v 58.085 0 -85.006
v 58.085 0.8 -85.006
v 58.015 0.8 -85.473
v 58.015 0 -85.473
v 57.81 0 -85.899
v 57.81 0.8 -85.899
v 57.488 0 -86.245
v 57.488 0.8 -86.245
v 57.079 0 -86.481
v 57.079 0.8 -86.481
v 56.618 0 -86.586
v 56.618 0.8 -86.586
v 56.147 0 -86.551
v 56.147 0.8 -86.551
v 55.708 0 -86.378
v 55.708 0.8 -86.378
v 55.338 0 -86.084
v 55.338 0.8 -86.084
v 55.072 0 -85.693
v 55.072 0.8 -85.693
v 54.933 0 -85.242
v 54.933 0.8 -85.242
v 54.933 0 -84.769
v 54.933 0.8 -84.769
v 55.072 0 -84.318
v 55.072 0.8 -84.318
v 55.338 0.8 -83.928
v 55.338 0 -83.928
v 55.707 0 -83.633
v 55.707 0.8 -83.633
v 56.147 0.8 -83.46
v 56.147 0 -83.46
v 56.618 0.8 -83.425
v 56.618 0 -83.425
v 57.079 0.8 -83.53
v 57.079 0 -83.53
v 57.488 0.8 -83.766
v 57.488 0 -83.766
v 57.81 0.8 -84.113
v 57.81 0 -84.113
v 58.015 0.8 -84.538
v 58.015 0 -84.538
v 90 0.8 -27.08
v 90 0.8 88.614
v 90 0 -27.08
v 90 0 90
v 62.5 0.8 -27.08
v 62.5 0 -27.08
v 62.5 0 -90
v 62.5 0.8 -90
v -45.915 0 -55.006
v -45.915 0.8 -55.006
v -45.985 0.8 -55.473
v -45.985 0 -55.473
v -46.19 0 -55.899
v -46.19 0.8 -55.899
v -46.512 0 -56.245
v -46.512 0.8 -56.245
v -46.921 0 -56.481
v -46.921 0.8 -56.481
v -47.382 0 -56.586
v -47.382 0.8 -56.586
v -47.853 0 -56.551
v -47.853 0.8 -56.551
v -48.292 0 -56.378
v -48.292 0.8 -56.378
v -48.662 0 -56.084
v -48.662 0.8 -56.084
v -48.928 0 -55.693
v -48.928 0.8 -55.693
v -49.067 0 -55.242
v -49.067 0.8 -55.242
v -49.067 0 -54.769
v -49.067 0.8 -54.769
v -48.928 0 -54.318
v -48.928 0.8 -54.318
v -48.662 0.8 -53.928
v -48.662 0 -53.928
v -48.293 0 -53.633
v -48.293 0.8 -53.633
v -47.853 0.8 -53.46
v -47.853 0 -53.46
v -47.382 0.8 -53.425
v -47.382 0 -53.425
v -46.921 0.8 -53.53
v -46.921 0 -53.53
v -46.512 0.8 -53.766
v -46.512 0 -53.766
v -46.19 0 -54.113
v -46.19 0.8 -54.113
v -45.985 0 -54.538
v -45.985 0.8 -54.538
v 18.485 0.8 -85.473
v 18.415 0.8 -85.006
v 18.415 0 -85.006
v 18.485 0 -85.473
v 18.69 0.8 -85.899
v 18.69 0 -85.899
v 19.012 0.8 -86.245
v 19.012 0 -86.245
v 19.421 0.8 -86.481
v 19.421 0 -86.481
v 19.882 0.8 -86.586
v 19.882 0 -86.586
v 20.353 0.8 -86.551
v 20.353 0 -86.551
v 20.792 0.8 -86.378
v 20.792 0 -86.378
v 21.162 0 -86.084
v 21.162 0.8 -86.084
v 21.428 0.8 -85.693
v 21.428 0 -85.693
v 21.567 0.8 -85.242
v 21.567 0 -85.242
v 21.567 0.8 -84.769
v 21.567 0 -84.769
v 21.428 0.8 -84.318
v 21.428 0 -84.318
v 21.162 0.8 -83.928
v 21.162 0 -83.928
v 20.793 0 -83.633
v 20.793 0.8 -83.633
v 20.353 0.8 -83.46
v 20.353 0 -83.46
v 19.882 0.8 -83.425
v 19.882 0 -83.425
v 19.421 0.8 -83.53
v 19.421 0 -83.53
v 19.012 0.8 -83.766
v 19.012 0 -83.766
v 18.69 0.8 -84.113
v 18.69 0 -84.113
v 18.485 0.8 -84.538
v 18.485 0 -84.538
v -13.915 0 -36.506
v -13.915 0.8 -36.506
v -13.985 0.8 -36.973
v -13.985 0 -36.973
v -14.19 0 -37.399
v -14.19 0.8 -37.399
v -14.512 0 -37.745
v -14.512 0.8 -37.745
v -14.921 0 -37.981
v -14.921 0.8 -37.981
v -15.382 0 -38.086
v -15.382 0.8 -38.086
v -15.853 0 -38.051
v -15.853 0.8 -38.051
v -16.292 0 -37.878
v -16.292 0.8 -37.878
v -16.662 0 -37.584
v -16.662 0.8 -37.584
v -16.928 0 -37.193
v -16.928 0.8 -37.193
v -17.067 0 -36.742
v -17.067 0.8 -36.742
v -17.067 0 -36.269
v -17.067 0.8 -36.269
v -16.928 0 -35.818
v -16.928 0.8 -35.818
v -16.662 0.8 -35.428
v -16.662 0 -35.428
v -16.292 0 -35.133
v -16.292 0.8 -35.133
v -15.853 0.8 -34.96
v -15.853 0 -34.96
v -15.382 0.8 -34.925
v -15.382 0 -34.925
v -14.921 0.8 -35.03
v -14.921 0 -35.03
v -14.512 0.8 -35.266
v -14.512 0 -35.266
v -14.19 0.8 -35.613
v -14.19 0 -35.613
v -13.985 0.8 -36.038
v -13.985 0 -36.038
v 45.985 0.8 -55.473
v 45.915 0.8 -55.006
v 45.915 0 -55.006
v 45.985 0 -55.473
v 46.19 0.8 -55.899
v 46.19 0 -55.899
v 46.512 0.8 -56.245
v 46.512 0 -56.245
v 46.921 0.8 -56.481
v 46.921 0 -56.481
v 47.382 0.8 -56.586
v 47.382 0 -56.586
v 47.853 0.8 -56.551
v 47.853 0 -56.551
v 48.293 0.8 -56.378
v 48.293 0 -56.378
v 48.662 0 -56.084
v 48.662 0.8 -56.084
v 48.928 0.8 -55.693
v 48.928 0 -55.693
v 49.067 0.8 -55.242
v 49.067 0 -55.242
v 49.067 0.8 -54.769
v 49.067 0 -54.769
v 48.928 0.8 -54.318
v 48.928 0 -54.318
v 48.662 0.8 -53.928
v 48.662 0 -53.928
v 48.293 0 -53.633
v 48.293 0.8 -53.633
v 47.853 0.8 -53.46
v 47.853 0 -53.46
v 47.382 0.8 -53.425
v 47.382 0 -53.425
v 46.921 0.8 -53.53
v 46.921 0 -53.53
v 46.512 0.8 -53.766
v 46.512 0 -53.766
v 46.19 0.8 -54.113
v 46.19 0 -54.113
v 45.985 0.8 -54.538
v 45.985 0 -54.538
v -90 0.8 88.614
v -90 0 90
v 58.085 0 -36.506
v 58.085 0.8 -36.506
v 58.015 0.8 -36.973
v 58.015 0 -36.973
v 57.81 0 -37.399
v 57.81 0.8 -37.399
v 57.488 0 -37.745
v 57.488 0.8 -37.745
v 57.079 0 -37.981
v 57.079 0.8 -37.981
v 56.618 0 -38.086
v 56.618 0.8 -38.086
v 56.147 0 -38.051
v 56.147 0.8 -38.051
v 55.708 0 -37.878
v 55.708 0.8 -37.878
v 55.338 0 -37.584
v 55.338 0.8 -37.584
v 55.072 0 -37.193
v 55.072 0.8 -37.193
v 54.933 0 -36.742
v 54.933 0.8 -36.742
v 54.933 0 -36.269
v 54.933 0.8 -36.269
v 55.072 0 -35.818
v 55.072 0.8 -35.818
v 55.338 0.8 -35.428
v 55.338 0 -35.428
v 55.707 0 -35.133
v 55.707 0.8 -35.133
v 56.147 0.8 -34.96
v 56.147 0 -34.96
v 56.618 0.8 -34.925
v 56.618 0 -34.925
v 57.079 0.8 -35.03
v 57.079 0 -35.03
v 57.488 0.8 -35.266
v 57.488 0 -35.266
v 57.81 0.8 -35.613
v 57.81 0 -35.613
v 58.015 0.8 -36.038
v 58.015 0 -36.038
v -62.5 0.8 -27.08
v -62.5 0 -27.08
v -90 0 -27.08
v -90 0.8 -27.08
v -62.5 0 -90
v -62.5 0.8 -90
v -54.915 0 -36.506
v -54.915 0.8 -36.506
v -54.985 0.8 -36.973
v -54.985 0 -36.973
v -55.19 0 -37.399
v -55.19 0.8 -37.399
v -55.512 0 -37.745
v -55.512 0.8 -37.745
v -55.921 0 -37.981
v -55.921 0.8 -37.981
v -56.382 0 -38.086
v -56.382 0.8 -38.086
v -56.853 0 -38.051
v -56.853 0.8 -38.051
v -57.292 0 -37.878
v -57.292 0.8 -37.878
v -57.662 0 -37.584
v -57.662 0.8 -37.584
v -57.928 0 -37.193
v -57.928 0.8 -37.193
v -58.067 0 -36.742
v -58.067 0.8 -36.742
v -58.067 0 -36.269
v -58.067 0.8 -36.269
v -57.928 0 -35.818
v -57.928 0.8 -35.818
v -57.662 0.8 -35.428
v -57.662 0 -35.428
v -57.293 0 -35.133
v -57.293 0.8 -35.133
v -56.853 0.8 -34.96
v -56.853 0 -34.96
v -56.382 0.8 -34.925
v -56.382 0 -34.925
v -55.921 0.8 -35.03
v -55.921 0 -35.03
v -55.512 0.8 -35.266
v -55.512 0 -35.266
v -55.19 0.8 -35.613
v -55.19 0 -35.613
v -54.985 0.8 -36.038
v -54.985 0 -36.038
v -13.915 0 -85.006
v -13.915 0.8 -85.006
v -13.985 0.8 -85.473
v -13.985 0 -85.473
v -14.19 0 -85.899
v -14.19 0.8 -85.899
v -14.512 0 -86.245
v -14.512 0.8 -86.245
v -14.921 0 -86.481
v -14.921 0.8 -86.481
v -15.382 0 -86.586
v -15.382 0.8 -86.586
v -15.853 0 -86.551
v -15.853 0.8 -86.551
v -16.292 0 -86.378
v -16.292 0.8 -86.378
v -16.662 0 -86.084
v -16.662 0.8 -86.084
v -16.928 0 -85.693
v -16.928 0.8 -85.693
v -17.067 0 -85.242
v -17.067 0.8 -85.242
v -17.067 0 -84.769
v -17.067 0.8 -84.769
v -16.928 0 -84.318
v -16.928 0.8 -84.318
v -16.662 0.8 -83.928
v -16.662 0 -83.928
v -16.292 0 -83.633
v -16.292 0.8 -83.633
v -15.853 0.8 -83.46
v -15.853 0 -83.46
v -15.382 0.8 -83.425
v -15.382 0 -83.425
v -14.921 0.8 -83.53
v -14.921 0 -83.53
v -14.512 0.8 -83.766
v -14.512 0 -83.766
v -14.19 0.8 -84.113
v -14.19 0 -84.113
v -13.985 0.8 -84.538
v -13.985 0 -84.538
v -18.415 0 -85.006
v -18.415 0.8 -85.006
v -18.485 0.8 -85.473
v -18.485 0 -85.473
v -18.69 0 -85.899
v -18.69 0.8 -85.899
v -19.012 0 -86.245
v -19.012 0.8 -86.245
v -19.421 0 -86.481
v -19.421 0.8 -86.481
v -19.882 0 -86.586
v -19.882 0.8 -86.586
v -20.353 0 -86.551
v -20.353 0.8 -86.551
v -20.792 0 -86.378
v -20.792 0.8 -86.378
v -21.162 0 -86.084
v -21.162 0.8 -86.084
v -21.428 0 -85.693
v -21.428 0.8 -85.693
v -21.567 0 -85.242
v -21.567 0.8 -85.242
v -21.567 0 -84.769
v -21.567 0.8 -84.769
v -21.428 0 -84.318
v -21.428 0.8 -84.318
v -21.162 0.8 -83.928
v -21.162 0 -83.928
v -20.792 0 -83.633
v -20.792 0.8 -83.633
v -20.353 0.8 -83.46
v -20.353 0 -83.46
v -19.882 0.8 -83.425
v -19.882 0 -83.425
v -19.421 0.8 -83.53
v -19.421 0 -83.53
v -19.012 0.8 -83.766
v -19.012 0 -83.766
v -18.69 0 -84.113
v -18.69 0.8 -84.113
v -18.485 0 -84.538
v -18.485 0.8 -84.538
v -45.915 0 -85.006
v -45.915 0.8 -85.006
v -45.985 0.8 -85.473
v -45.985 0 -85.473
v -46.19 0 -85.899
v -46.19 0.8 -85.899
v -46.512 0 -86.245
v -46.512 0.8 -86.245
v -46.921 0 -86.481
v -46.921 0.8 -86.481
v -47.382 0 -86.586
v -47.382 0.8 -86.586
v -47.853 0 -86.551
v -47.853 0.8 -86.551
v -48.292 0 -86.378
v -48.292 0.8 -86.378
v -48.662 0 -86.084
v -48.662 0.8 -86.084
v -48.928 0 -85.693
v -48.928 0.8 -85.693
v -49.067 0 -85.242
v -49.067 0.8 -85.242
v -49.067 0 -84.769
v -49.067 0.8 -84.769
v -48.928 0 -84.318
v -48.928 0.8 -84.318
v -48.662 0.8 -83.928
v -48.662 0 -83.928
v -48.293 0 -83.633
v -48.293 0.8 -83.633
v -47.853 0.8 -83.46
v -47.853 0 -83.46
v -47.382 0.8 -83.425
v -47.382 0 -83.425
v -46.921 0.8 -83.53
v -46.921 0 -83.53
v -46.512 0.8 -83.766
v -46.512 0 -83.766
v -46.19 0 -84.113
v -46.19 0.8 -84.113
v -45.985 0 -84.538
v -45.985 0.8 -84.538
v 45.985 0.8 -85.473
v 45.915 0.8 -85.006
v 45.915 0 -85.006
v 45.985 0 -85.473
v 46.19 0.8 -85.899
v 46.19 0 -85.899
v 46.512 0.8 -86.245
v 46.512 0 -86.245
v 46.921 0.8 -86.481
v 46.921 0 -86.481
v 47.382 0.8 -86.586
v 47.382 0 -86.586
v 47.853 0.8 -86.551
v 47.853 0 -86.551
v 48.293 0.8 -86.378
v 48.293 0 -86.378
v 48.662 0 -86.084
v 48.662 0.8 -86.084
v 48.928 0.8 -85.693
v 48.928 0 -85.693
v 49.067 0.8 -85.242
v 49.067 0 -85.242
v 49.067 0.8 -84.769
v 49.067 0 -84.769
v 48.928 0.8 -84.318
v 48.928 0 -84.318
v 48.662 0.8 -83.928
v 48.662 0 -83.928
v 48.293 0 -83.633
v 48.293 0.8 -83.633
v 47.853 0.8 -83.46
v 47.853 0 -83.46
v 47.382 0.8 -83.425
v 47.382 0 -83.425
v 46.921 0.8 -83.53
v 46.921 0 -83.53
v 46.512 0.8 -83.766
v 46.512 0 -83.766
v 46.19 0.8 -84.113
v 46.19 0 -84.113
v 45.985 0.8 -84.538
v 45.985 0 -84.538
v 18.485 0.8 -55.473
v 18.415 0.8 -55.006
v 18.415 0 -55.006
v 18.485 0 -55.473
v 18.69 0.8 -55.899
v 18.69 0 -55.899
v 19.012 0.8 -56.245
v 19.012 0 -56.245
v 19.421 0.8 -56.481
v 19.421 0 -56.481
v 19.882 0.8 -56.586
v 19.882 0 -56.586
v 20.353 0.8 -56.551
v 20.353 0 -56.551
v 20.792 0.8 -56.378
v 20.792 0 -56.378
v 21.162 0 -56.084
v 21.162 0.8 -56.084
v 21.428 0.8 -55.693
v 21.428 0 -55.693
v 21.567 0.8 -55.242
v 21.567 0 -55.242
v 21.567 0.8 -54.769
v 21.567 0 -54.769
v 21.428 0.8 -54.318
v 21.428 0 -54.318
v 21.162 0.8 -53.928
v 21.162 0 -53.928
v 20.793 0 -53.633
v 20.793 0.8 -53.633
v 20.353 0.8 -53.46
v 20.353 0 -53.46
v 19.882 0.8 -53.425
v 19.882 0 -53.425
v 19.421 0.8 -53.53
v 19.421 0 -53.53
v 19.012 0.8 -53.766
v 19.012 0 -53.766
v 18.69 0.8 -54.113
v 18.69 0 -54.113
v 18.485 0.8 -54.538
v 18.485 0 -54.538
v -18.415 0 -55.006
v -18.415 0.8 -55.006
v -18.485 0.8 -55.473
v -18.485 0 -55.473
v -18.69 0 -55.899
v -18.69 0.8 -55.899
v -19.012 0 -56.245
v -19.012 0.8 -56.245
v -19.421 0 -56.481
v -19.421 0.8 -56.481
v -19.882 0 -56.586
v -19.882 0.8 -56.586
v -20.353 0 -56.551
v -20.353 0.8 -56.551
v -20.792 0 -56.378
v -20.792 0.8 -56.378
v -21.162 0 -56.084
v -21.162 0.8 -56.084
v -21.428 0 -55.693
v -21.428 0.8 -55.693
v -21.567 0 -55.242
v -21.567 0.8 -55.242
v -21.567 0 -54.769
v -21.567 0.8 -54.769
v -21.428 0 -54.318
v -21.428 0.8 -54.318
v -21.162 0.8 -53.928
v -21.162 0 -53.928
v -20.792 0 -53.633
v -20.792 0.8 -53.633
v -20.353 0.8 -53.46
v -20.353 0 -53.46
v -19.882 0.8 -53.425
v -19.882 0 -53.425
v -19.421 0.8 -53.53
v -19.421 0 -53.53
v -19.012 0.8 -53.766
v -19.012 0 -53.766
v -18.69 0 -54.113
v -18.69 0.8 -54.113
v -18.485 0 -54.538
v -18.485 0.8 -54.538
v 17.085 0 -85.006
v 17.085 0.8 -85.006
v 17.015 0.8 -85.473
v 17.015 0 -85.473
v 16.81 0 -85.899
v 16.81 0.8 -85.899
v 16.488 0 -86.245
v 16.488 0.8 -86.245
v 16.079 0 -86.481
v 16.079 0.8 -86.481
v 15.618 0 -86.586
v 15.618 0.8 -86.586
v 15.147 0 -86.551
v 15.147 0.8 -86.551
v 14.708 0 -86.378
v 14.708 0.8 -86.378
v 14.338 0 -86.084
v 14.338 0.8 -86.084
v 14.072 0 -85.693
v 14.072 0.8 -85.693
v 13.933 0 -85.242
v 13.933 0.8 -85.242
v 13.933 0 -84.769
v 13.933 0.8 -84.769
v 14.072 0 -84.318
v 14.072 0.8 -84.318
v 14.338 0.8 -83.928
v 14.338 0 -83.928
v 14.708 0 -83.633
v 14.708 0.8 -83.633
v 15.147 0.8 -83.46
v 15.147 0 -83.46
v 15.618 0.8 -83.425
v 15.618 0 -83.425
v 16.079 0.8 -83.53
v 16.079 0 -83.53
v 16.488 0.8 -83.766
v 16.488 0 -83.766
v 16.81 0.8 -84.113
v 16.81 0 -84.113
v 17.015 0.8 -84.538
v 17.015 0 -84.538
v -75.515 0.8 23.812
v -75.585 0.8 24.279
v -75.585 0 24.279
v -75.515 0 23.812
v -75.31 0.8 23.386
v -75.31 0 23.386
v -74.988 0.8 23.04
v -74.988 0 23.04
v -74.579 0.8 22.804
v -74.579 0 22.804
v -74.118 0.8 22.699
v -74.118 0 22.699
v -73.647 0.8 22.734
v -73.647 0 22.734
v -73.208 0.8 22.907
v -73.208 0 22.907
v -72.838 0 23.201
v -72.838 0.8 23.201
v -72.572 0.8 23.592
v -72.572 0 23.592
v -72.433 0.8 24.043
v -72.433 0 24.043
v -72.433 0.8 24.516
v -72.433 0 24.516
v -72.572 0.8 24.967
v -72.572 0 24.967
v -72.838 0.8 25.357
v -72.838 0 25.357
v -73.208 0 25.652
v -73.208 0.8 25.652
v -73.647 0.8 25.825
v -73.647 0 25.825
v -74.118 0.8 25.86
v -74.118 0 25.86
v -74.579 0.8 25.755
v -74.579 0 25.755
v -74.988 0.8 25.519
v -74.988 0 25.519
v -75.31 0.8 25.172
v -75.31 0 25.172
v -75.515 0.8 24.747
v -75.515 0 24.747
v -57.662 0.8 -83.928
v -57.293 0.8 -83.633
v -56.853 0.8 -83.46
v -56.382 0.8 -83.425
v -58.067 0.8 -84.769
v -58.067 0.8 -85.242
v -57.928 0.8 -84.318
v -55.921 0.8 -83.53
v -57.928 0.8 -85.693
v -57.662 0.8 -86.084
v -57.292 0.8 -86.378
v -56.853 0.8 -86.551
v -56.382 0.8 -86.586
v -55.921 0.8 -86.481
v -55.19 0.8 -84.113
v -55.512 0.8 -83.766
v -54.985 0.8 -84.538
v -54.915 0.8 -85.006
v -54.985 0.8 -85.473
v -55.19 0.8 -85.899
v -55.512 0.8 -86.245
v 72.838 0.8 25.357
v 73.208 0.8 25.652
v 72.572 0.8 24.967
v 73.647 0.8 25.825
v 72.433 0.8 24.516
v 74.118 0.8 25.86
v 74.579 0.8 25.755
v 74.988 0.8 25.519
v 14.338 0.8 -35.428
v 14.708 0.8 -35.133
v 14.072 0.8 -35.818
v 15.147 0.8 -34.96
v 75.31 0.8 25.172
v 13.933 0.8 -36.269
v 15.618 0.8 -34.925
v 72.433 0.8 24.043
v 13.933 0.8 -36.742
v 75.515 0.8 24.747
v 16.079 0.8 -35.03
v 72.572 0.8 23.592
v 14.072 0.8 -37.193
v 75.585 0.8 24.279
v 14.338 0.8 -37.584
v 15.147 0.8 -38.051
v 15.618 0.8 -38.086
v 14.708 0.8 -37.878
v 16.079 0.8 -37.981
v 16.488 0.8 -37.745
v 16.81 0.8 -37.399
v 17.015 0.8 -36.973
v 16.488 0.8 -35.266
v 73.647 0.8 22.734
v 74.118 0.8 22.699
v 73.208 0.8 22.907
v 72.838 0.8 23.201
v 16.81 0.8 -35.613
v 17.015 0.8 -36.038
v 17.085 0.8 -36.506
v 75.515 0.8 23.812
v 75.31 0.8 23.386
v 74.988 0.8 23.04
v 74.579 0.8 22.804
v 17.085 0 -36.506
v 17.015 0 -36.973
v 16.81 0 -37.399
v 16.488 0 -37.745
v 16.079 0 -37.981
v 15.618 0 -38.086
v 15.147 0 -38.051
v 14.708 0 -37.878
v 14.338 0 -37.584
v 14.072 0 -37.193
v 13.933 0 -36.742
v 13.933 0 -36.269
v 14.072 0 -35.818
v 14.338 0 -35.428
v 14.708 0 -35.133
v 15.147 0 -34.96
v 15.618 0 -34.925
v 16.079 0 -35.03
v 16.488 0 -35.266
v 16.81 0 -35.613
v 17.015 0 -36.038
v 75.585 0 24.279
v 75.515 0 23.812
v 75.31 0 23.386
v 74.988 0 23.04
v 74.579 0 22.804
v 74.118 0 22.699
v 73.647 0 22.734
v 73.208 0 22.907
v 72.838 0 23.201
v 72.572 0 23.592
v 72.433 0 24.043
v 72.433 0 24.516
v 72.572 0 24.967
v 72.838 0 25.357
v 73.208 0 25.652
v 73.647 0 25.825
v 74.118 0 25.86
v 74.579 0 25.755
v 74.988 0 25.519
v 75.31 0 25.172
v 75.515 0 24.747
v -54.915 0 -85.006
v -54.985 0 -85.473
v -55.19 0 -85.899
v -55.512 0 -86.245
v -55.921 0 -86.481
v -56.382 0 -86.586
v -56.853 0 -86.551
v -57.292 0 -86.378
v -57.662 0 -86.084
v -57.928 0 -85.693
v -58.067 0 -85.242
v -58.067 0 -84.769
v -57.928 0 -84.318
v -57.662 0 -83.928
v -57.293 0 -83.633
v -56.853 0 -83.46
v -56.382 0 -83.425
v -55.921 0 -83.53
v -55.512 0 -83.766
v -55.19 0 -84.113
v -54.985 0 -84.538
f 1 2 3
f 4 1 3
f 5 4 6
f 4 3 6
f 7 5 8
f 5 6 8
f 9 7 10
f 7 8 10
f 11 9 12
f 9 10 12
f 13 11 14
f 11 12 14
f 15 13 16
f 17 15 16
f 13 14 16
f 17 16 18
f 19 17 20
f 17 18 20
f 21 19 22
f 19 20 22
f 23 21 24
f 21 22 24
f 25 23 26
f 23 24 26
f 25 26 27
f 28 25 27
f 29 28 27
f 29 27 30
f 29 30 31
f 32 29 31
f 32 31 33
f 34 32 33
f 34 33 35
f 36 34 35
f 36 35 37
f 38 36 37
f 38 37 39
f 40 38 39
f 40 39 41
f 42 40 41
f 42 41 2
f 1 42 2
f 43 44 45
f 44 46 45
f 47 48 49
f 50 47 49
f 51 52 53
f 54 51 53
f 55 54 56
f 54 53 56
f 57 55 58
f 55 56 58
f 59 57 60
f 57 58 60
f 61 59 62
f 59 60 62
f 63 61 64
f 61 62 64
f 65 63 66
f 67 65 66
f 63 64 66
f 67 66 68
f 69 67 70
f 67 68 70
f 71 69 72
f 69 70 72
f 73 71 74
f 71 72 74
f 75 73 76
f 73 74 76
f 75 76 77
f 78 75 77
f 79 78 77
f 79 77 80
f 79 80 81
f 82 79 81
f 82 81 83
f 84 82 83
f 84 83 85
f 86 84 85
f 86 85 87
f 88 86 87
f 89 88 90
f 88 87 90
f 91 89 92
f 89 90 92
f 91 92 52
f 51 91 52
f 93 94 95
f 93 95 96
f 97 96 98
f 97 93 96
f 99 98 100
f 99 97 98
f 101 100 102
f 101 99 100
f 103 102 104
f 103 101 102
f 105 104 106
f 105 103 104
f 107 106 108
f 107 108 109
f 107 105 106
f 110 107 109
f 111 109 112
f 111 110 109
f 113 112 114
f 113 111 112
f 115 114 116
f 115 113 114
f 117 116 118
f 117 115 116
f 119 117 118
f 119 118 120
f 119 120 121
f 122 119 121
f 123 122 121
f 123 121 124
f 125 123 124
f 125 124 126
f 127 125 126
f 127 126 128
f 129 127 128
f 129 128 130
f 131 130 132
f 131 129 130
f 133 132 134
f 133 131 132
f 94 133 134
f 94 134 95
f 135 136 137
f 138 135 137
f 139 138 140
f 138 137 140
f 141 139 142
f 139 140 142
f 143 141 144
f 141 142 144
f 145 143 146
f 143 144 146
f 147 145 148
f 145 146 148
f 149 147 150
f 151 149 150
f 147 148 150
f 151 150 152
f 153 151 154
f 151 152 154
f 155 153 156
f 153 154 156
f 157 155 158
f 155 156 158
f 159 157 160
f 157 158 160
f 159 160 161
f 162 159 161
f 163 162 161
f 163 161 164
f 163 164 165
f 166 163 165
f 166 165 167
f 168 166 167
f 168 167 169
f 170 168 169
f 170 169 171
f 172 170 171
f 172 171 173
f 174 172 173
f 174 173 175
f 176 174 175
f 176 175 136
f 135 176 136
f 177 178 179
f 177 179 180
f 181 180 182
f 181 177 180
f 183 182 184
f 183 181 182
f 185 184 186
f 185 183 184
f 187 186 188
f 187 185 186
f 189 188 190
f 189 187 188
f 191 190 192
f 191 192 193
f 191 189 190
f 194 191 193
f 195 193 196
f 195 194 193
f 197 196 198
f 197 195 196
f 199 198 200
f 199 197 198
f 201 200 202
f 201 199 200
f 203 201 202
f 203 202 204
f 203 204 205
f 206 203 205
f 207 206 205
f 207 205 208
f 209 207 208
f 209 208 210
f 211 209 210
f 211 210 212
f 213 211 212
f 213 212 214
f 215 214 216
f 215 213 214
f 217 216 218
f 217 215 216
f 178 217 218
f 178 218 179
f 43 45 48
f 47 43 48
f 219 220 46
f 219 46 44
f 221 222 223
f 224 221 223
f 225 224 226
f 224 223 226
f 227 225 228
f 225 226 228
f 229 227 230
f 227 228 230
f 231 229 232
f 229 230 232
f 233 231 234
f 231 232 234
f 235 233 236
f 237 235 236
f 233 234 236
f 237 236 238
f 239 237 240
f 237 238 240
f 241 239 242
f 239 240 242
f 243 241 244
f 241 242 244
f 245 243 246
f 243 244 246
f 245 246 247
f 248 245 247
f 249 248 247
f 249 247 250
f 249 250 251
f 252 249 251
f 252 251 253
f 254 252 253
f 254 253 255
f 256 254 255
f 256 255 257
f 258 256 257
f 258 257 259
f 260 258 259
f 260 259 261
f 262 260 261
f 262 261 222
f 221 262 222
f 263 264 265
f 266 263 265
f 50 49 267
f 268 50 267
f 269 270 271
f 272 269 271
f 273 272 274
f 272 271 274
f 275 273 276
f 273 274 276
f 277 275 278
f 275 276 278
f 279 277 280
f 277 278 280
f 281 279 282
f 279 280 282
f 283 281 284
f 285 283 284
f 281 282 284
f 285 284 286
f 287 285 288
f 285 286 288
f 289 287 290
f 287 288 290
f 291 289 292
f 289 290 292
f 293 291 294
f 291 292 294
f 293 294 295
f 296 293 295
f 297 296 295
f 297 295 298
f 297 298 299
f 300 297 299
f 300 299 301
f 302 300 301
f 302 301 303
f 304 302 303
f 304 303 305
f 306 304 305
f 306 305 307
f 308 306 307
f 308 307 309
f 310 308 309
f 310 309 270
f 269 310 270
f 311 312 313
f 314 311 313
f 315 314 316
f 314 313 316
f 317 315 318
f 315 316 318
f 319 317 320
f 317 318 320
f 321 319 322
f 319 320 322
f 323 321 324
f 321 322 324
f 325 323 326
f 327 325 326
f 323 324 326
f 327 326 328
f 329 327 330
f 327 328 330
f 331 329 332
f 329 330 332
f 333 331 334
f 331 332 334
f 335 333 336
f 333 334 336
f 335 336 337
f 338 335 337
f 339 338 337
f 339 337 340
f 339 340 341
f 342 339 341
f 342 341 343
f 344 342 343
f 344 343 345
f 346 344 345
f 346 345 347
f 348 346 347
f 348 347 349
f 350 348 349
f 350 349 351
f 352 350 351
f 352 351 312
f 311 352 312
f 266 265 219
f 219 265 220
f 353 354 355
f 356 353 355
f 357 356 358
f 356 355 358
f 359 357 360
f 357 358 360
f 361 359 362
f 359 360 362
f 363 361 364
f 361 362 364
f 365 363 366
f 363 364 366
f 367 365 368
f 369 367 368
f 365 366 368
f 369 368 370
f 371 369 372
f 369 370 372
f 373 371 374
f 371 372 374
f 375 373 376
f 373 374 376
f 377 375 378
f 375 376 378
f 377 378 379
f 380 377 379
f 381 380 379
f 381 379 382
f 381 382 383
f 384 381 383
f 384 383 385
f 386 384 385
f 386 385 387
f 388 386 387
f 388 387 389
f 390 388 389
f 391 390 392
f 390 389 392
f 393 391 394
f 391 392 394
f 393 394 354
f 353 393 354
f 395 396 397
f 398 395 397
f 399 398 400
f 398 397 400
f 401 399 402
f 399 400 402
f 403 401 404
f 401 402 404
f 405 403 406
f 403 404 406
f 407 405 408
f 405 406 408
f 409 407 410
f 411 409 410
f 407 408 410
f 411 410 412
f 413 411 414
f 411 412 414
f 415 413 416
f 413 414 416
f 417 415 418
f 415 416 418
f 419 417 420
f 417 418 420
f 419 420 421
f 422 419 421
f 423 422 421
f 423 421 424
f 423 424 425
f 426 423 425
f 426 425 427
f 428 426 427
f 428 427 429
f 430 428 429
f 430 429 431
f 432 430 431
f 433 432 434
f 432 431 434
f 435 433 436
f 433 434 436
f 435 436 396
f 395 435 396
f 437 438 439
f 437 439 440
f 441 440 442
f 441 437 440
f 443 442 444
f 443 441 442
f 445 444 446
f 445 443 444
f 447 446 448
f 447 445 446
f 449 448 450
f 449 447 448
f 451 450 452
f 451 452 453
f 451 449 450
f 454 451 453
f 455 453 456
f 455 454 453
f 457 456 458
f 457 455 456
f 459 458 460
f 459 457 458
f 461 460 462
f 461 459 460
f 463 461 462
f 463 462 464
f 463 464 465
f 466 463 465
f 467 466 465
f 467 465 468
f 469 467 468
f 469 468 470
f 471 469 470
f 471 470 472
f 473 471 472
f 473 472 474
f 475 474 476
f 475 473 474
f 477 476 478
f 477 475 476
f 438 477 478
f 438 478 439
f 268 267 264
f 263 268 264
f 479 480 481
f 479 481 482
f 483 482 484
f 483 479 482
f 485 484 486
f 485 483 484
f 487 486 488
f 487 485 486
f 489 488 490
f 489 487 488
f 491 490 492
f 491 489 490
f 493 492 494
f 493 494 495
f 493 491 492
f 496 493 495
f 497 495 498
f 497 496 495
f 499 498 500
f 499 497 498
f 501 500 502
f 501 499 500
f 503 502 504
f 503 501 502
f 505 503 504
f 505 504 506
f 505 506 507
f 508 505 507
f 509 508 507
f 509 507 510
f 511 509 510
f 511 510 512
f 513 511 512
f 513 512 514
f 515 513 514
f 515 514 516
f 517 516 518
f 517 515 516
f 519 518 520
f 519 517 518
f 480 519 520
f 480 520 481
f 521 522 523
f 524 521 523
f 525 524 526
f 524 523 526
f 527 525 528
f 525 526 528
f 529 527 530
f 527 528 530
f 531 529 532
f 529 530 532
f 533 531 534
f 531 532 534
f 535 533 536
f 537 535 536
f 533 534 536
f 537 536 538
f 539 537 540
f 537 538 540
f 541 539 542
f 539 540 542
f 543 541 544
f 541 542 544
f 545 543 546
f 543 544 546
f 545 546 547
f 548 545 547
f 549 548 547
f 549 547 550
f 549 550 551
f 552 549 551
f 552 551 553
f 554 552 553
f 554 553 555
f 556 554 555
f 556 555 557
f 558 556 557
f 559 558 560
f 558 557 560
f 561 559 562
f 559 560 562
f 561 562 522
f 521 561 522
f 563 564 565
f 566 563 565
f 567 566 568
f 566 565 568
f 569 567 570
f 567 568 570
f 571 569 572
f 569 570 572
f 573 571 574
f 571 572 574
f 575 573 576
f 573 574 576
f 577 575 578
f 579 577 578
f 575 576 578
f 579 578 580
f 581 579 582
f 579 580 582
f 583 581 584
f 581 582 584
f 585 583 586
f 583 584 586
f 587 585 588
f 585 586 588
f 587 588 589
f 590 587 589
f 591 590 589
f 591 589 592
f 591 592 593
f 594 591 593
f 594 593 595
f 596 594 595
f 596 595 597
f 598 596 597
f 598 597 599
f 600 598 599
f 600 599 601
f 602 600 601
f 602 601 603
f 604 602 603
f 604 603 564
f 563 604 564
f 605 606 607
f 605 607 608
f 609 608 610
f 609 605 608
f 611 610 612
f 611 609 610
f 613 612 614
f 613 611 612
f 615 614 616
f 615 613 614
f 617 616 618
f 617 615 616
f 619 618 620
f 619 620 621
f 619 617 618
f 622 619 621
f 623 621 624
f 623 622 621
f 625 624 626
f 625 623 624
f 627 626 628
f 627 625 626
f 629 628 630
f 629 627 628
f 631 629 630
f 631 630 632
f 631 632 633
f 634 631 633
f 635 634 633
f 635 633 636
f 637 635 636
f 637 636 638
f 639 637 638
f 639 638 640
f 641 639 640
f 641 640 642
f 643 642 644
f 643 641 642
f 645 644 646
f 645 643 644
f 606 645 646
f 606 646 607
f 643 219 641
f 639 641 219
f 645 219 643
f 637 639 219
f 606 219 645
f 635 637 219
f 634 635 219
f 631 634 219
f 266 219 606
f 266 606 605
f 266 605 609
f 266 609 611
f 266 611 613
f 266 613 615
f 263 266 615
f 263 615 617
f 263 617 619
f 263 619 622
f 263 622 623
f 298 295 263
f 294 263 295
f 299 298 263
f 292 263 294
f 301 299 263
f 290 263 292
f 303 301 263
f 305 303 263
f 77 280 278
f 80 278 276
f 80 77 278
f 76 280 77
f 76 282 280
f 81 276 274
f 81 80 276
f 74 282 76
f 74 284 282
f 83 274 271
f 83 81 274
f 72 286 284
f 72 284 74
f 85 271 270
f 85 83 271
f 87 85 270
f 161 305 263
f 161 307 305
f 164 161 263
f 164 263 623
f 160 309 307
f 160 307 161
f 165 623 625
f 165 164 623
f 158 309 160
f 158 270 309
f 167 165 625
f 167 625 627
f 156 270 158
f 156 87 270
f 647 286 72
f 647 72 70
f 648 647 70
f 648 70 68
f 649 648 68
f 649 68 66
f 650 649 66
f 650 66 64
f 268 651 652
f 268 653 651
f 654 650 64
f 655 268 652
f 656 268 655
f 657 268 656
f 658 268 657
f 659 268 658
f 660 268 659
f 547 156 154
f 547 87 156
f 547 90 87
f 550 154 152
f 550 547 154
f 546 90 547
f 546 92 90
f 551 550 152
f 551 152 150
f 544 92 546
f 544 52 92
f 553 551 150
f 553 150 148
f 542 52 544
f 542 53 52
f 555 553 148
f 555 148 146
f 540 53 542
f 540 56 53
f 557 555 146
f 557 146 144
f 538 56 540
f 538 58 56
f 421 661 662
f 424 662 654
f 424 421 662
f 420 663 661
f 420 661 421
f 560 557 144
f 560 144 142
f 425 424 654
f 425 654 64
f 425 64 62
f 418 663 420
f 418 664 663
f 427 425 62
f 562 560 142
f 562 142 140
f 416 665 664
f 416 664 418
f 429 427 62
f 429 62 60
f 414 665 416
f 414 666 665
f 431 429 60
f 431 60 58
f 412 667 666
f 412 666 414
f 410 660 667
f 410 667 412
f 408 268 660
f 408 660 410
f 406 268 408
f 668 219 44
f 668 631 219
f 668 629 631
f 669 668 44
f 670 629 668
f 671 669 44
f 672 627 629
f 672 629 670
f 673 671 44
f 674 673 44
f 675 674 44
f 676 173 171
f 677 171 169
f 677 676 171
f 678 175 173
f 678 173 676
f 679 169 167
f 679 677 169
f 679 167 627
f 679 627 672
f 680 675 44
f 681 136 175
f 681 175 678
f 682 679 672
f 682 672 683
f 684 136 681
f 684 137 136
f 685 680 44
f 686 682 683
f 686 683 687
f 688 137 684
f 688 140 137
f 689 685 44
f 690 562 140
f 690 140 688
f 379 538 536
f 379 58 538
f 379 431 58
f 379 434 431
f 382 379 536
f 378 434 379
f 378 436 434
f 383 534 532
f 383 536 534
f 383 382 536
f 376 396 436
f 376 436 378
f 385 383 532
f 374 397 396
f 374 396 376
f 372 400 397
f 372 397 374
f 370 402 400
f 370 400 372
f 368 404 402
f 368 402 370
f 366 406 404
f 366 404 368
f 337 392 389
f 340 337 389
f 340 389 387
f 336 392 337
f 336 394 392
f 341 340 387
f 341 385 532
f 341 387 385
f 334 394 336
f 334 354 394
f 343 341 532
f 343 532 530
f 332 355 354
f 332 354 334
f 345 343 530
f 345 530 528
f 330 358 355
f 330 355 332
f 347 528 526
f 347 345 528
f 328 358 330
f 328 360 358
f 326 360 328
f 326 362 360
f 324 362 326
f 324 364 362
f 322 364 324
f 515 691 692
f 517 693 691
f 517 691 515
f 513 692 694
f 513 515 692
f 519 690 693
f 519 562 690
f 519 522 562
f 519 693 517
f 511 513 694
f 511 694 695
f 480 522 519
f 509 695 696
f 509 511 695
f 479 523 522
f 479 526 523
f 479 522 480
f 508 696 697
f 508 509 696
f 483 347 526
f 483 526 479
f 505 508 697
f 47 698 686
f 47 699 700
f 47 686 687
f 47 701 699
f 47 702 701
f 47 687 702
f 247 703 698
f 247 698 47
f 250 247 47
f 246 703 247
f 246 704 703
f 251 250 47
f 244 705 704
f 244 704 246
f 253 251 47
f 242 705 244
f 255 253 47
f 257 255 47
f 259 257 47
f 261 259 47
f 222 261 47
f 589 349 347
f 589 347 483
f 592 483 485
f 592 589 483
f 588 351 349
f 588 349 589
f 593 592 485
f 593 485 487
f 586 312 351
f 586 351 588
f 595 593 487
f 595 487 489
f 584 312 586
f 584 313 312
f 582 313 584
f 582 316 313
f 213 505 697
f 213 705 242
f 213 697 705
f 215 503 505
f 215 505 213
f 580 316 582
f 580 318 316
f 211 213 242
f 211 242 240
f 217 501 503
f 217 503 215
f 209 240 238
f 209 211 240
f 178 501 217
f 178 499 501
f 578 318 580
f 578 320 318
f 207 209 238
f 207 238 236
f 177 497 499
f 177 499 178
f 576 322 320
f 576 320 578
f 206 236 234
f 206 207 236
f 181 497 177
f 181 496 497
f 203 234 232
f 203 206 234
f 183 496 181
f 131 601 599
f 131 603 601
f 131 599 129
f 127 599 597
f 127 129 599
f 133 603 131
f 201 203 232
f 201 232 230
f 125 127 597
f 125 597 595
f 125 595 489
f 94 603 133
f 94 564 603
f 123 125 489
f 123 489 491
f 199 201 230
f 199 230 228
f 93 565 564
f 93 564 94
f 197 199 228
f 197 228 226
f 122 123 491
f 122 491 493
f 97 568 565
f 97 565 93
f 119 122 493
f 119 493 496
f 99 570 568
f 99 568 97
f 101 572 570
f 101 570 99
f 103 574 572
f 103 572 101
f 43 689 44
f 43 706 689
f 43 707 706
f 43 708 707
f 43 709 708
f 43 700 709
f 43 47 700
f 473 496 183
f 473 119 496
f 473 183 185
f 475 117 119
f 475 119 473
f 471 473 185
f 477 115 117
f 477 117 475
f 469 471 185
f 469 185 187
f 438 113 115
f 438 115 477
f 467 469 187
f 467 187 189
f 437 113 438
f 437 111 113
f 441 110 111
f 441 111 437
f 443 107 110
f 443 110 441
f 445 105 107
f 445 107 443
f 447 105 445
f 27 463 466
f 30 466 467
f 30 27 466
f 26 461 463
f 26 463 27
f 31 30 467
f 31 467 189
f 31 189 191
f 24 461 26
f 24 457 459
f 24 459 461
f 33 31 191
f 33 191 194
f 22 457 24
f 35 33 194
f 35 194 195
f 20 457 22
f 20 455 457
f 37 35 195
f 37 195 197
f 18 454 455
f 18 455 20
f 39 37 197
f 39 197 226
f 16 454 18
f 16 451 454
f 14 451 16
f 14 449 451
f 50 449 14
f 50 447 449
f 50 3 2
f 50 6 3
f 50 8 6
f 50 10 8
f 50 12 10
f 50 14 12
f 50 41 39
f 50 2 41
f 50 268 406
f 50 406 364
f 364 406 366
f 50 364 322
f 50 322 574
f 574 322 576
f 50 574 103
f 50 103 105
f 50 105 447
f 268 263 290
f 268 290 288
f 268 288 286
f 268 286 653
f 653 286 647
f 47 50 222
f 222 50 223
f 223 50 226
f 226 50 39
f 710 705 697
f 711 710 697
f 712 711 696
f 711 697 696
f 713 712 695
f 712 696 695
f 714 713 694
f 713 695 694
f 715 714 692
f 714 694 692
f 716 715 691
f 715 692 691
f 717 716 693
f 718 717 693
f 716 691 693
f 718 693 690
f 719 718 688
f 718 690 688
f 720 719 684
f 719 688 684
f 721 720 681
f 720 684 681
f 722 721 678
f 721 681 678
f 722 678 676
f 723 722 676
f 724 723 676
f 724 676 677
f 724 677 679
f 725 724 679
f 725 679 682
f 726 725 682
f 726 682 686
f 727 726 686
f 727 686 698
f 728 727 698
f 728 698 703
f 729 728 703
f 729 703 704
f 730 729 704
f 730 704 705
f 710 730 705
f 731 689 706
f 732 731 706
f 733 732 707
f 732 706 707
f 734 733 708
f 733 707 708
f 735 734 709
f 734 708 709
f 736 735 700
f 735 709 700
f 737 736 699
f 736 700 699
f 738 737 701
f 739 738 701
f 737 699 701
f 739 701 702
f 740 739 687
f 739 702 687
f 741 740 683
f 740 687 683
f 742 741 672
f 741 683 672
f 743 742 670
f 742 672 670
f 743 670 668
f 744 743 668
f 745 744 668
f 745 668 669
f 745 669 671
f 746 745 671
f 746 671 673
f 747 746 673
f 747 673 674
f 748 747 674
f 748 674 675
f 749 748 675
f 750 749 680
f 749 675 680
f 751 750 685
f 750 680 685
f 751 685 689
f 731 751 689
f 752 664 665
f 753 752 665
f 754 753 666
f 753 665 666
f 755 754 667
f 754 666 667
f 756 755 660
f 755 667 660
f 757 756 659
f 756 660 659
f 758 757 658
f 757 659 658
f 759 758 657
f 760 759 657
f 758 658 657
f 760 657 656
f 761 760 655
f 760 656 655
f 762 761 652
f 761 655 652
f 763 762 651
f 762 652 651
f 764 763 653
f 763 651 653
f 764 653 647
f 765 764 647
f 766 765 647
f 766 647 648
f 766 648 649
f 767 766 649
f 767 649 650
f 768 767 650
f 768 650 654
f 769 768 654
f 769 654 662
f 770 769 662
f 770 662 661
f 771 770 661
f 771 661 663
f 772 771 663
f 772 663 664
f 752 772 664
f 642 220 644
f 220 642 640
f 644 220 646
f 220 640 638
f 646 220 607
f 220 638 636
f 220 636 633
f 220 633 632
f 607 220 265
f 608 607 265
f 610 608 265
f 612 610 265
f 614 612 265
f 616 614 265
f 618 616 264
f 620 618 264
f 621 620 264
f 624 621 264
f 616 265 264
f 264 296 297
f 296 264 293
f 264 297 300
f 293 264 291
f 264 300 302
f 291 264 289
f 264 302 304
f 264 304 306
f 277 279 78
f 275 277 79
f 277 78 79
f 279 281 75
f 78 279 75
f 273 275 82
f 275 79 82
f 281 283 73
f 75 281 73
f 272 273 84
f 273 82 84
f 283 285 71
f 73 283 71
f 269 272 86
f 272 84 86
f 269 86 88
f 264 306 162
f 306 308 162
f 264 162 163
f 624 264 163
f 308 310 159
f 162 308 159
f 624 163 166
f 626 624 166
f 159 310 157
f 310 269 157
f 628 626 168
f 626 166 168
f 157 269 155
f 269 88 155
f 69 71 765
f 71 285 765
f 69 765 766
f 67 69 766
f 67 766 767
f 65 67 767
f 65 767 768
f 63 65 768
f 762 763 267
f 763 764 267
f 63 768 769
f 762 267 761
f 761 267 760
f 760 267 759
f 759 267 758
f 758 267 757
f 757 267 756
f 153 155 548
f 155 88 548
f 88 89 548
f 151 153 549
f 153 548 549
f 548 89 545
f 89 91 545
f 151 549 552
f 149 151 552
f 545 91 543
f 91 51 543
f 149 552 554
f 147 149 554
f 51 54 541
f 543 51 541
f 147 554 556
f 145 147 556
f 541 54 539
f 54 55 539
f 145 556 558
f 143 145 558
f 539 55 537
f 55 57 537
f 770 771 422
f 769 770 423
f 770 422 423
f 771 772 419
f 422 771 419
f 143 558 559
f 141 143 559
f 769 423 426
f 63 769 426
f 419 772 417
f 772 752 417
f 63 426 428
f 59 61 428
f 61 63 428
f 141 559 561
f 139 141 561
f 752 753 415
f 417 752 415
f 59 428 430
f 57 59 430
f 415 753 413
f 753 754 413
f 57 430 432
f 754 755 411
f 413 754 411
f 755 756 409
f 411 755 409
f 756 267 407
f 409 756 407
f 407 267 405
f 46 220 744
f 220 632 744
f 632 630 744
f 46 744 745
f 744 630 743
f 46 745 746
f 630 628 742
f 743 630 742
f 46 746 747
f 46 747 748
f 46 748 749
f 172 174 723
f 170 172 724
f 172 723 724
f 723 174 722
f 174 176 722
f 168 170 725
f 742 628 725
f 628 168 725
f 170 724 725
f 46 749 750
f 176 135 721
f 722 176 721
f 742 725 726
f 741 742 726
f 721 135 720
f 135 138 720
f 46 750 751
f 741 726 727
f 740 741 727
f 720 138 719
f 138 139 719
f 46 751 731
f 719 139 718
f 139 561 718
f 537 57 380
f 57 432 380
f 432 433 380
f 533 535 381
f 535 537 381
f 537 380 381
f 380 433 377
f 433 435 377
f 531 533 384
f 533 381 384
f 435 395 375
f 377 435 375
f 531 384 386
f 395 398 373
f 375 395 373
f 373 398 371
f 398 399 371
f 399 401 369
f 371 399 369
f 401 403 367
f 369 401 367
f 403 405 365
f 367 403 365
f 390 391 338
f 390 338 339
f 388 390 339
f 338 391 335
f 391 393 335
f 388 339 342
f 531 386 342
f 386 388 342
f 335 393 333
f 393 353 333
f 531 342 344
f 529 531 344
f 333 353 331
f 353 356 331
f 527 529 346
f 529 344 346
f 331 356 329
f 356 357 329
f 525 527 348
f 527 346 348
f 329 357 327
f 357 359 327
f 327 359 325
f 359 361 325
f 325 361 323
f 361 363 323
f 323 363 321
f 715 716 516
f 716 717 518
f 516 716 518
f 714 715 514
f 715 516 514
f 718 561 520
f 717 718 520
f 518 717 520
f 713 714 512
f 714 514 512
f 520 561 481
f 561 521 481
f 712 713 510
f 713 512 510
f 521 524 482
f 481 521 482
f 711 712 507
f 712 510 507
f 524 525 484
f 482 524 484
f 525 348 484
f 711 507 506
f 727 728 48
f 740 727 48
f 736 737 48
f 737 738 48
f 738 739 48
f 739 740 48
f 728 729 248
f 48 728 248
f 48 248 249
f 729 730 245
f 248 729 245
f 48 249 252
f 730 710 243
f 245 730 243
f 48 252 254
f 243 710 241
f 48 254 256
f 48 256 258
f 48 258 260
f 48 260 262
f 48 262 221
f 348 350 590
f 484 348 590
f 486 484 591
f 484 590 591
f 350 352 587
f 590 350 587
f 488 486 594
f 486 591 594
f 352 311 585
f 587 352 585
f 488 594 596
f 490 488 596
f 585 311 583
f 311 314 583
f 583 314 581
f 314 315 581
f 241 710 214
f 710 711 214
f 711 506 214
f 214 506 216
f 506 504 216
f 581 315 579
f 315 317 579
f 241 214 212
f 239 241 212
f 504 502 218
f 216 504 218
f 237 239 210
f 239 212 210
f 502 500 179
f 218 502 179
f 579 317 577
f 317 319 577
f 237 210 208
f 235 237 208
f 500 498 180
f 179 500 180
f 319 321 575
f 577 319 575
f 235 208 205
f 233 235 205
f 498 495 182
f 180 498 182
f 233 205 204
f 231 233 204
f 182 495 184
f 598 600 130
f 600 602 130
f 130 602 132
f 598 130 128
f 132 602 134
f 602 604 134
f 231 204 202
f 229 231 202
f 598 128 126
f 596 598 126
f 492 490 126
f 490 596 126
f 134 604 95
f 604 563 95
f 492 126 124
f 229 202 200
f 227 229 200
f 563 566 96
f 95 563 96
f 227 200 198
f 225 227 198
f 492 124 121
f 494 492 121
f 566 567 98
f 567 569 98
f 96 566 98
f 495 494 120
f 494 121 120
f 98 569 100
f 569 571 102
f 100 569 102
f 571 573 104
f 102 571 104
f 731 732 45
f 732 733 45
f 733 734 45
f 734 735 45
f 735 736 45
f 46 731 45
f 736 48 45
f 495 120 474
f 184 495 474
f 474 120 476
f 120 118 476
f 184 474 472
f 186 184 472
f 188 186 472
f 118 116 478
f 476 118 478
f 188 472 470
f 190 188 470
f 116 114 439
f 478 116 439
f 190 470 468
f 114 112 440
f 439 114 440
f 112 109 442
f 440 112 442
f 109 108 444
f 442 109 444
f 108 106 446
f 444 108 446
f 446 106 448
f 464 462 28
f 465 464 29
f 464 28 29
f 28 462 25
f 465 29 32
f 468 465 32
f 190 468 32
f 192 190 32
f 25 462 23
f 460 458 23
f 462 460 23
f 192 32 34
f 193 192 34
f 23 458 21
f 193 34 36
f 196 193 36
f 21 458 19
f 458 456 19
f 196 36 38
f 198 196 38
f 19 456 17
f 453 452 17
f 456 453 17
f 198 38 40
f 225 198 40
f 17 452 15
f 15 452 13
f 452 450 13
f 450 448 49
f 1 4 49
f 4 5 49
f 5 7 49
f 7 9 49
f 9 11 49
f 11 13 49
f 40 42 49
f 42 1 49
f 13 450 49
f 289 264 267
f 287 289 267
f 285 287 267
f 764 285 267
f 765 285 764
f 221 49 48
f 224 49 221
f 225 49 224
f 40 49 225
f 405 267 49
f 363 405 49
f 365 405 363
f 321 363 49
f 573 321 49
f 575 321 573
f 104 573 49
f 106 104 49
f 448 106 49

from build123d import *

# Parameters (mm, degrees)
SALIENTE_EXTRUIR1_DEPTH = 0.8
CORTAR_EXTRUIR1_REACH   = 182
CROQUIS3_R              = 1.585
CORTAR_EXTRUIR2_DEPTH   = 0.8
CORTAR_EXTRUIR3_REACH   = 2.8
CROQUIS4_R              = 1.585
CORTAR_EXTRUIR4_REACH   = 2.8
CROQUIS6_R              = 1.585
CROQUIS7_R              = 1.585
CORTAR_EXTRUIR5_DEPTH   = 0.8


with BuildPart() as part:
    # Croquis1 → Saliente-Extruir1 (new body)
    with BuildSketch(Plane(origin=(0, 0, 0), x_dir=(1, 0, 0), z_dir=(0, 1, 0))):
        Polygon((-62.5, 90), (-62.5, 27.08), (-90, 27.08), (-90, -90), (90, -90), (90, 27.08), (62.5, 27.08), (62.5, 90), align=None)
    extrude(amount=SALIENTE_EXTRUIR1_DEPTH)

    # Croquis2 → Cortar-Extruir1 (cut, up to next)
    with BuildSketch(Plane.ZY.offset(90), mode=Mode.PRIVATE) as cortar_extruir1_sk1:
        Polygon((90, 0), (88.614359354, 0.8), (90, 0.8), align=None)
    cortar_extruir1_tool1 = extrude(cortar_extruir1_sk1.sketch, amount=-CORTAR_EXTRUIR1_REACH, mode=Mode.PRIVATE) & part.part
    add(cortar_extruir1_tool1.solids().sort_by_distance((-90, 0.533333, 89.53812))[0], mode=Mode.SUBTRACT)

    # Croquis3 → Cortar-Extruir2 (cut)
    with BuildSketch(Plane(origin=(0, 0.8, 0), x_dir=(1, 0, 0), z_dir=(0, 1, 0))):
        with Locations((74, -24.279339937)):
            Circle(CROQUIS3_R)
    cortar_extruir2 = extrude(amount=-CORTAR_EXTRUIR2_DEPTH, mode=Mode.SUBTRACT)

    # Simetría1: Cortar-Extruir2 across plane
    add(cortar_extruir2.mirror(Plane(origin=(0, 0, 0), x_dir=(0, 0, 1), z_dir=(1, 0, 0))), mode=Mode.SUBTRACT)

    # Croquis4 → Cortar-Extruir3 (cut, up to next)
    with BuildSketch(Plane(origin=(0, 0.8, 0), x_dir=(1, 0, 0), z_dir=(0, 1, 0)), mode=Mode.PRIVATE) as cortar_extruir3_sk1:
        with Locations((-56.5, 36.505640646)):
            Circle(CROQUIS4_R)
    cortar_extruir3_tool1 = extrude(cortar_extruir3_sk1.sketch, amount=-CORTAR_EXTRUIR3_REACH, mode=Mode.PRIVATE) & part.part
    add(cortar_extruir3_tool1.solids().sort_by_distance((-56.5, 0.8, -36.505641))[0], mode=Mode.SUBTRACT)
    # Croquis4 → Cortar-Extruir3 (cut, up to next)
    with BuildSketch(Plane(origin=(0, 0.8, 0), x_dir=(1, 0, 0), z_dir=(0, 1, 0)), mode=Mode.PRIVATE) as cortar_extruir3_sk2:
        with Locations((-15.5, 36.505640646)):
            Circle(CROQUIS4_R)
    cortar_extruir3_tool2 = extrude(cortar_extruir3_sk2.sketch, amount=-CORTAR_EXTRUIR3_REACH, mode=Mode.PRIVATE) & part.part
    add(cortar_extruir3_tool2.solids().sort_by_distance((-15.5, 0.8, -36.505641))[0], mode=Mode.SUBTRACT)
    # Croquis4 → Cortar-Extruir3 (cut, up to next)
    with BuildSketch(Plane(origin=(0, 0.8, 0), x_dir=(1, 0, 0), z_dir=(0, 1, 0)), mode=Mode.PRIVATE) as cortar_extruir3_sk3:
        with Locations((-15.5, 85.005640646)):
            Circle(CROQUIS4_R)
    cortar_extruir3_tool3 = extrude(cortar_extruir3_sk3.sketch, amount=-CORTAR_EXTRUIR3_REACH, mode=Mode.PRIVATE) & part.part
    add(cortar_extruir3_tool3.solids().sort_by_distance((-15.5, 0.8, -85.005641))[0], mode=Mode.SUBTRACT)
    # Croquis4 → Cortar-Extruir3 (cut, up to next)
    with BuildSketch(Plane(origin=(0, 0.8, 0), x_dir=(1, 0, 0), z_dir=(0, 1, 0)), mode=Mode.PRIVATE) as cortar_extruir3_sk4:
        with Locations((-56.5, 85.005640646)):
            Circle(CROQUIS4_R)
    cortar_extruir3_tool4 = extrude(cortar_extruir3_sk4.sketch, amount=-CORTAR_EXTRUIR3_REACH, mode=Mode.PRIVATE) & part.part
    add(cortar_extruir3_tool4.solids().sort_by_distance((-56.5, 0.8, -85.005641))[0], mode=Mode.SUBTRACT)

    # Croquis6 → Cortar-Extruir4 (cut, up to next)
    with BuildSketch(Plane(origin=(0, 0.8, 0), x_dir=(1, 0, 0), z_dir=(0, 1, 0)), mode=Mode.PRIVATE) as cortar_extruir4_sk1:
        with Locations((56.5, 85.005640646)):
            Circle(CROQUIS6_R)
    cortar_extruir4_tool1 = extrude(cortar_extruir4_sk1.sketch, amount=-CORTAR_EXTRUIR4_REACH, mode=Mode.PRIVATE) & part.part
    add(cortar_extruir4_tool1.solids().sort_by_distance((56.5, 0.8, -85.005641))[0], mode=Mode.SUBTRACT)
    # Croquis6 → Cortar-Extruir4 (cut, up to next)
    with BuildSketch(Plane(origin=(0, 0.8, 0), x_dir=(1, 0, 0), z_dir=(0, 1, 0)), mode=Mode.PRIVATE) as cortar_extruir4_sk2:
        with Locations((15.5, 85.005640646)):
            Circle(CROQUIS6_R)
    cortar_extruir4_tool2 = extrude(cortar_extruir4_sk2.sketch, amount=-CORTAR_EXTRUIR4_REACH, mode=Mode.PRIVATE) & part.part
    add(cortar_extruir4_tool2.solids().sort_by_distance((15.5, 0.8, -85.005641))[0], mode=Mode.SUBTRACT)
    # Croquis6 → Cortar-Extruir4 (cut, up to next)
    with BuildSketch(Plane(origin=(0, 0.8, 0), x_dir=(1, 0, 0), z_dir=(0, 1, 0)), mode=Mode.PRIVATE) as cortar_extruir4_sk3:
        with Locations((15.5, 36.505640646)):
            Circle(CROQUIS6_R)
    cortar_extruir4_tool3 = extrude(cortar_extruir4_sk3.sketch, amount=-CORTAR_EXTRUIR4_REACH, mode=Mode.PRIVATE) & part.part
    add(cortar_extruir4_tool3.solids().sort_by_distance((15.5, 0.8, -36.505641))[0], mode=Mode.SUBTRACT)
    # Croquis6 → Cortar-Extruir4 (cut, up to next)
    with BuildSketch(Plane(origin=(0, 0.8, 0), x_dir=(1, 0, 0), z_dir=(0, 1, 0)), mode=Mode.PRIVATE) as cortar_extruir4_sk4:
        with Locations((56.5, 36.505640646)):
            Circle(CROQUIS6_R)
    cortar_extruir4_tool4 = extrude(cortar_extruir4_sk4.sketch, amount=-CORTAR_EXTRUIR4_REACH, mode=Mode.PRIVATE) & part.part
    add(cortar_extruir4_tool4.solids().sort_by_distance((56.5, 0.8, -36.505641))[0], mode=Mode.SUBTRACT)

    # Croquis7 → Cortar-Extruir5 (cut)
    with BuildSketch(Plane(origin=(0, 0.8, 0), x_dir=(1, 0, 0), z_dir=(0, 1, 0))):
        with Locations((-20, 85.005640646)):
            Circle(CROQUIS7_R)
        with Locations((-47.5, 85.005640646)):
            Circle(CROQUIS7_R)
        with Locations((-47.5, 55.005640646)):
            Circle(CROQUIS7_R)
        with Locations((-20, 55.005640646)):
            Circle(CROQUIS7_R)
    cortar_extruir5 = extrude(amount=-CORTAR_EXTRUIR5_DEPTH, mode=Mode.SUBTRACT)

    # Simetría2: Cortar-Extruir5 across plane
    add(cortar_extruir5.mirror(Plane(origin=(0, 0, 0), x_dir=(0, 0, 1), z_dir=(1, 0, 0))), mode=Mode.SUBTRACT)


solid = part.part
